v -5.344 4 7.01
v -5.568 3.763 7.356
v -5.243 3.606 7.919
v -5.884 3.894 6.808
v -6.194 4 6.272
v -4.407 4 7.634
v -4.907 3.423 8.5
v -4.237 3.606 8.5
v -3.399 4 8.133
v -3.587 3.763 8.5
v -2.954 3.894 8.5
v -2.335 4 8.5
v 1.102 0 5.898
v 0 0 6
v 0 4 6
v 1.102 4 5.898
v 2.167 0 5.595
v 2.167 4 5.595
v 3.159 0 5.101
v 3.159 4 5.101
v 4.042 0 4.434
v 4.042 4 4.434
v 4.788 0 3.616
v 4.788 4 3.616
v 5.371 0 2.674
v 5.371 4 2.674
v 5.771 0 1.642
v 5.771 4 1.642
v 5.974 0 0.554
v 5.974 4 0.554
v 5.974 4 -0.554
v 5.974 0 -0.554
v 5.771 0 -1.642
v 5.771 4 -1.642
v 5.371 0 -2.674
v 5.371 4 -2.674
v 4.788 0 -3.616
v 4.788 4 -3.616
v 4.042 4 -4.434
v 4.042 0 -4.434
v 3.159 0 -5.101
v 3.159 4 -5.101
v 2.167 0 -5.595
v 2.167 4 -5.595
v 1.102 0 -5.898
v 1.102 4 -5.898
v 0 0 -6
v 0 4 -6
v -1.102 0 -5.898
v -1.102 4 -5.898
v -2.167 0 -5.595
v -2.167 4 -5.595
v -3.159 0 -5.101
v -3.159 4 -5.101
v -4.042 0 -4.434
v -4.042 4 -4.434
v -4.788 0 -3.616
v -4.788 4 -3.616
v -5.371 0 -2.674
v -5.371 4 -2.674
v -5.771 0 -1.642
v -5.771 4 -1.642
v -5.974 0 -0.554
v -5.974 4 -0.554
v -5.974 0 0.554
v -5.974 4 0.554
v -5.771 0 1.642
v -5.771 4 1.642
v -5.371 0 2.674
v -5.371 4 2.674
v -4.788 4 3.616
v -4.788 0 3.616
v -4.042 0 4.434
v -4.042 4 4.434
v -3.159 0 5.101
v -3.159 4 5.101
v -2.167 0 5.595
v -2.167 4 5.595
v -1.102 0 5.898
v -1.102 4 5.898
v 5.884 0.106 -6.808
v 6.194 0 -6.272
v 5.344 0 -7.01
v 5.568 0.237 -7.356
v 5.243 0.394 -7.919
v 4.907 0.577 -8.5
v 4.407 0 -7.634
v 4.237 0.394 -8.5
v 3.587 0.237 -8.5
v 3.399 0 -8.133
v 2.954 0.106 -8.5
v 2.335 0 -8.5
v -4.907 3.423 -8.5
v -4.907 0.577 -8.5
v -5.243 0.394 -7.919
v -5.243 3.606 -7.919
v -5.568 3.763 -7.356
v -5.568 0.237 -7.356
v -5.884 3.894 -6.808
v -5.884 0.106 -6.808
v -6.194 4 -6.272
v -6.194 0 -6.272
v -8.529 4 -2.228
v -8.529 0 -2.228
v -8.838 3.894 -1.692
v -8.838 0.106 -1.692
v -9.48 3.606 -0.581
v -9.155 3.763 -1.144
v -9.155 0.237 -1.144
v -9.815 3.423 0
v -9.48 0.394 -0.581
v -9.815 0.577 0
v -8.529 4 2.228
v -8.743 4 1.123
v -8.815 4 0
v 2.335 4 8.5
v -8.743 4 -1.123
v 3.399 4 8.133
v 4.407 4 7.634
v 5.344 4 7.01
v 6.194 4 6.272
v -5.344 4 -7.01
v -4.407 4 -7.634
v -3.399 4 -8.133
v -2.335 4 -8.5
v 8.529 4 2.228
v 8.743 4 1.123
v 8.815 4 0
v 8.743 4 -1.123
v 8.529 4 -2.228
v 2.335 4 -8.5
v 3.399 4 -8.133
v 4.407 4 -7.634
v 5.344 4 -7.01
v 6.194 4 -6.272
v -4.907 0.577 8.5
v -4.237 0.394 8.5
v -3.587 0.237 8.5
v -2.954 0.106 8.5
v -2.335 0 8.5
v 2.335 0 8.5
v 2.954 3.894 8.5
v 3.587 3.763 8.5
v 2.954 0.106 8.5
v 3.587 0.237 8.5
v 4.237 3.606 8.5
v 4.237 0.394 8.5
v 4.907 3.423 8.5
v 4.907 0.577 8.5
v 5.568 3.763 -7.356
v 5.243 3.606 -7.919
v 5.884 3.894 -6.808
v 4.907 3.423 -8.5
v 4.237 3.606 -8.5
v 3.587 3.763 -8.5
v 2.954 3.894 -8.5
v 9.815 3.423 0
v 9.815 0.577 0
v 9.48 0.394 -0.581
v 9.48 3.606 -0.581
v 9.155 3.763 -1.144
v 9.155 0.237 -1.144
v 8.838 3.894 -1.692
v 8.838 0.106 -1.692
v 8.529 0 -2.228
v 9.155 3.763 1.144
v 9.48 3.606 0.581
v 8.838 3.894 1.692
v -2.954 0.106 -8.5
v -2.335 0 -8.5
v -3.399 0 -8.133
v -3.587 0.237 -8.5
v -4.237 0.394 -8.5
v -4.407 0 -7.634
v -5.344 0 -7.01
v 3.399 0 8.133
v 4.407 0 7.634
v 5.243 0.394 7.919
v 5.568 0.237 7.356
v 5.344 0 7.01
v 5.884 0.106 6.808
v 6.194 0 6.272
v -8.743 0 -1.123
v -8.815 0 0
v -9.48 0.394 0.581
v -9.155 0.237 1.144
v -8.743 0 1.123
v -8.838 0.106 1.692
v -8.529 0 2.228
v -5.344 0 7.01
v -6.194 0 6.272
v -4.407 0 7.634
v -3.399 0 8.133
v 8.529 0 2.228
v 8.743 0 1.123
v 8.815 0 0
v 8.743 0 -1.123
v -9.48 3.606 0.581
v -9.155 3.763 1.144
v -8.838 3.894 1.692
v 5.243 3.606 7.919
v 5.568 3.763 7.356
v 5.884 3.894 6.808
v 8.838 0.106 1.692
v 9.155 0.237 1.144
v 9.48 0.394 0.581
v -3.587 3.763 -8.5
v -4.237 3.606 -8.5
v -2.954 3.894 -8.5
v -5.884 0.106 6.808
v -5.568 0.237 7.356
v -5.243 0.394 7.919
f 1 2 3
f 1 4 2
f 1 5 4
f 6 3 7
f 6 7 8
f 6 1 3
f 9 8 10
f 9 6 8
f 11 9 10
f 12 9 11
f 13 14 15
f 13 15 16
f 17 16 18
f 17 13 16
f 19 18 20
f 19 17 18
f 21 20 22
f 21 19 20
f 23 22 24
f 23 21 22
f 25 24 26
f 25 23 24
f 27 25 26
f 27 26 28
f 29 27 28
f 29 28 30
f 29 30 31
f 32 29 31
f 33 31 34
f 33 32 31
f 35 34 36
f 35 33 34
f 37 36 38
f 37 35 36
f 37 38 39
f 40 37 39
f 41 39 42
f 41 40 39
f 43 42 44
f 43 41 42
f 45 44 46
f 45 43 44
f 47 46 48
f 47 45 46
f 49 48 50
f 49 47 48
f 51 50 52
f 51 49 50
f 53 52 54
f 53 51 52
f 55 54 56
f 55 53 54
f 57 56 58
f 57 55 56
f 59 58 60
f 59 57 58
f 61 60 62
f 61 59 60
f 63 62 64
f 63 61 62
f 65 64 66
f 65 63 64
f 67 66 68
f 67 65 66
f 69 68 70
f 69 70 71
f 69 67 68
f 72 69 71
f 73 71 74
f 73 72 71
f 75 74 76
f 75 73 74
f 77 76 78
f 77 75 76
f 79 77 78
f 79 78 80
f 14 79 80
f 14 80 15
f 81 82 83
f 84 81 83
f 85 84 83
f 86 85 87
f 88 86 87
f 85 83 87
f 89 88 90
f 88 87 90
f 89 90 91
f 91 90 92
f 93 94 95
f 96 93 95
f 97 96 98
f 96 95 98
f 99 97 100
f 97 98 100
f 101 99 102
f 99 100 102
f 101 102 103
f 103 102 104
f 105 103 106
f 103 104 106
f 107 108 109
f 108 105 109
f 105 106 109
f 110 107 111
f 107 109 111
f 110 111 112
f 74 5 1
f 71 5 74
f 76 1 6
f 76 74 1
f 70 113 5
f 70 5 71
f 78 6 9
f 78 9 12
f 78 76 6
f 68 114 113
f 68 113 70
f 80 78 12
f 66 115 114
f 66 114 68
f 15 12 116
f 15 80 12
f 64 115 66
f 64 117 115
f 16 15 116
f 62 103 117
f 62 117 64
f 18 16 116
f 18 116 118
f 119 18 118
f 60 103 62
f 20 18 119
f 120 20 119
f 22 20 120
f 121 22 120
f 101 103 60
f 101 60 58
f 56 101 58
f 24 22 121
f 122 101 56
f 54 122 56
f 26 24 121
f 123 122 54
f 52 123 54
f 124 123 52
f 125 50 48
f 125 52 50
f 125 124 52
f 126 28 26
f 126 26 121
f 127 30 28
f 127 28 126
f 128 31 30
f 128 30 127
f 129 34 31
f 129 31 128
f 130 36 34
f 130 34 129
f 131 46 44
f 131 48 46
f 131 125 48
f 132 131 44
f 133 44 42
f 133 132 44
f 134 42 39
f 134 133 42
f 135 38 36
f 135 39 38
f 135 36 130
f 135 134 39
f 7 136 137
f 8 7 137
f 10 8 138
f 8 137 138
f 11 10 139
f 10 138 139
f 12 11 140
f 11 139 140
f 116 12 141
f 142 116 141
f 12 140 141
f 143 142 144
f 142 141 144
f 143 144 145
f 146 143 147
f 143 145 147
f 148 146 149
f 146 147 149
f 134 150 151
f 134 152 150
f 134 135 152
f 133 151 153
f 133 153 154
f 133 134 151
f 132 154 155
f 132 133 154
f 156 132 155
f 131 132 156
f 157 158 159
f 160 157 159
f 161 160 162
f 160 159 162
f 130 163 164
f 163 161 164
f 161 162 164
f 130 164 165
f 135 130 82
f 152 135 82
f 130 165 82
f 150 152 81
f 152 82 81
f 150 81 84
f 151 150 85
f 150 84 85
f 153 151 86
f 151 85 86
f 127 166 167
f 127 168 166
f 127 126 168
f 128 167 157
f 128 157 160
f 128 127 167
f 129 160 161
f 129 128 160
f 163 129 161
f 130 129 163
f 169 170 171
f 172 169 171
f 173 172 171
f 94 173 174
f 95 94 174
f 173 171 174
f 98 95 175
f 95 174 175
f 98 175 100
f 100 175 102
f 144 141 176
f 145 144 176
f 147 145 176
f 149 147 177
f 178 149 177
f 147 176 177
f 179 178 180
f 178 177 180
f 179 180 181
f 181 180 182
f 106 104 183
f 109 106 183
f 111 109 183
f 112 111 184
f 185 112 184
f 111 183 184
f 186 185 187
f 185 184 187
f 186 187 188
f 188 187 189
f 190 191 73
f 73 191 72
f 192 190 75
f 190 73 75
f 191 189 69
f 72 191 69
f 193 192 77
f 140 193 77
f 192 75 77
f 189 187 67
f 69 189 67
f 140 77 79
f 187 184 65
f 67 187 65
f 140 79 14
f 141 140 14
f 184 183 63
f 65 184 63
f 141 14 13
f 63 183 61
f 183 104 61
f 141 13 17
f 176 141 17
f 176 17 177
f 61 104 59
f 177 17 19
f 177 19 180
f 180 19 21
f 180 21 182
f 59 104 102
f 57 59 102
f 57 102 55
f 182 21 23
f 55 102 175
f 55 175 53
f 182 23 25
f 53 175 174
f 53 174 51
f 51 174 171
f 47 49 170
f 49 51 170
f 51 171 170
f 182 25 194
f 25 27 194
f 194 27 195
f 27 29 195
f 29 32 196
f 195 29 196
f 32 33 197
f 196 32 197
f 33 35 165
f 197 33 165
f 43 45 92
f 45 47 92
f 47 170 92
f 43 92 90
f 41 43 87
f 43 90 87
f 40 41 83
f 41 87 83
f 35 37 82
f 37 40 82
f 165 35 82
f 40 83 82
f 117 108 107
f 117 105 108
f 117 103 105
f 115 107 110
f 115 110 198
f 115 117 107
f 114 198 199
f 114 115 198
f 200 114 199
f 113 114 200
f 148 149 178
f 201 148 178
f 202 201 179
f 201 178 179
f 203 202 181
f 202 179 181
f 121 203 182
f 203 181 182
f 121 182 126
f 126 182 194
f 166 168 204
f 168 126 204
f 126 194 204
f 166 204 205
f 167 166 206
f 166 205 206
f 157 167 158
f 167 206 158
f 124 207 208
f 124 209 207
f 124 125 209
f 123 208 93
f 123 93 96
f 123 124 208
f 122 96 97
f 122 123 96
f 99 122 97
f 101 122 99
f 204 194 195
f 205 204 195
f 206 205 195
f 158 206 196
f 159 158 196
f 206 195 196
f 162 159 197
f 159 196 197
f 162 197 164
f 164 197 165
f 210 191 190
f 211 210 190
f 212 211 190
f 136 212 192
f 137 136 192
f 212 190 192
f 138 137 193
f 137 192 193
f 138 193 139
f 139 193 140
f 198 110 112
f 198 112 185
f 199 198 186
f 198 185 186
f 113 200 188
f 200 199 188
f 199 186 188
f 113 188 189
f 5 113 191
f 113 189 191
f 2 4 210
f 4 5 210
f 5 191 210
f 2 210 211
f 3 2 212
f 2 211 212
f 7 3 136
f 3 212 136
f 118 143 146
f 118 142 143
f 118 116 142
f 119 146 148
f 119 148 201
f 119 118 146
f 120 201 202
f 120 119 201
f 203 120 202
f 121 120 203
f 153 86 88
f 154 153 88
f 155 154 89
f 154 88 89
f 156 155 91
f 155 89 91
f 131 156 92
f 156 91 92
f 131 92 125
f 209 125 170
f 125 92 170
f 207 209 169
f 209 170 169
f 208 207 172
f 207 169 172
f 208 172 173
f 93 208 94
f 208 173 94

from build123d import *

# Parameters (mm, degrees)
SKETCH1_R           = 6
BOSS_EXTRUDE1_DEPTH = 4


with BuildPart() as part:
    # Sketch1 → Boss-Extrude1 (new body)
    with BuildSketch(Plane(origin=(0, 0, 0), x_dir=(1, 0, 0), z_dir=(0, 1, 0))):
        Polygon((9.814954576, 0), (4.907477288, 8.5), (-4.907477288, 8.5), (-9.814954576, 0), (-4.907477288, -8.5), (4.907477288, -8.5), align=None)
        with Locations(Location((0, 0, 0), (0, 0, 270))):
            Circle(SKETCH1_R, mode=Mode.SUBTRACT)
    extrude(amount=BOSS_EXTRUDE1_DEPTH)

    # Sketch2 → Cut-Revolve1 (revolve, cut)
    with BuildSketch(Plane.XY):
        Polygon((-9.814954576, 3.422649731), (-8.814954576, 4), (-9.814954576, 4), align=None)
        Polygon((-9.814954576, 0), (-9.814954576, 0.577350269), (-8.814954576, 0), align=None)
    revolve(axis=Axis((0, 0, 0), (0, 1, 0)), mode=Mode.SUBTRACT)


solid = part.part
